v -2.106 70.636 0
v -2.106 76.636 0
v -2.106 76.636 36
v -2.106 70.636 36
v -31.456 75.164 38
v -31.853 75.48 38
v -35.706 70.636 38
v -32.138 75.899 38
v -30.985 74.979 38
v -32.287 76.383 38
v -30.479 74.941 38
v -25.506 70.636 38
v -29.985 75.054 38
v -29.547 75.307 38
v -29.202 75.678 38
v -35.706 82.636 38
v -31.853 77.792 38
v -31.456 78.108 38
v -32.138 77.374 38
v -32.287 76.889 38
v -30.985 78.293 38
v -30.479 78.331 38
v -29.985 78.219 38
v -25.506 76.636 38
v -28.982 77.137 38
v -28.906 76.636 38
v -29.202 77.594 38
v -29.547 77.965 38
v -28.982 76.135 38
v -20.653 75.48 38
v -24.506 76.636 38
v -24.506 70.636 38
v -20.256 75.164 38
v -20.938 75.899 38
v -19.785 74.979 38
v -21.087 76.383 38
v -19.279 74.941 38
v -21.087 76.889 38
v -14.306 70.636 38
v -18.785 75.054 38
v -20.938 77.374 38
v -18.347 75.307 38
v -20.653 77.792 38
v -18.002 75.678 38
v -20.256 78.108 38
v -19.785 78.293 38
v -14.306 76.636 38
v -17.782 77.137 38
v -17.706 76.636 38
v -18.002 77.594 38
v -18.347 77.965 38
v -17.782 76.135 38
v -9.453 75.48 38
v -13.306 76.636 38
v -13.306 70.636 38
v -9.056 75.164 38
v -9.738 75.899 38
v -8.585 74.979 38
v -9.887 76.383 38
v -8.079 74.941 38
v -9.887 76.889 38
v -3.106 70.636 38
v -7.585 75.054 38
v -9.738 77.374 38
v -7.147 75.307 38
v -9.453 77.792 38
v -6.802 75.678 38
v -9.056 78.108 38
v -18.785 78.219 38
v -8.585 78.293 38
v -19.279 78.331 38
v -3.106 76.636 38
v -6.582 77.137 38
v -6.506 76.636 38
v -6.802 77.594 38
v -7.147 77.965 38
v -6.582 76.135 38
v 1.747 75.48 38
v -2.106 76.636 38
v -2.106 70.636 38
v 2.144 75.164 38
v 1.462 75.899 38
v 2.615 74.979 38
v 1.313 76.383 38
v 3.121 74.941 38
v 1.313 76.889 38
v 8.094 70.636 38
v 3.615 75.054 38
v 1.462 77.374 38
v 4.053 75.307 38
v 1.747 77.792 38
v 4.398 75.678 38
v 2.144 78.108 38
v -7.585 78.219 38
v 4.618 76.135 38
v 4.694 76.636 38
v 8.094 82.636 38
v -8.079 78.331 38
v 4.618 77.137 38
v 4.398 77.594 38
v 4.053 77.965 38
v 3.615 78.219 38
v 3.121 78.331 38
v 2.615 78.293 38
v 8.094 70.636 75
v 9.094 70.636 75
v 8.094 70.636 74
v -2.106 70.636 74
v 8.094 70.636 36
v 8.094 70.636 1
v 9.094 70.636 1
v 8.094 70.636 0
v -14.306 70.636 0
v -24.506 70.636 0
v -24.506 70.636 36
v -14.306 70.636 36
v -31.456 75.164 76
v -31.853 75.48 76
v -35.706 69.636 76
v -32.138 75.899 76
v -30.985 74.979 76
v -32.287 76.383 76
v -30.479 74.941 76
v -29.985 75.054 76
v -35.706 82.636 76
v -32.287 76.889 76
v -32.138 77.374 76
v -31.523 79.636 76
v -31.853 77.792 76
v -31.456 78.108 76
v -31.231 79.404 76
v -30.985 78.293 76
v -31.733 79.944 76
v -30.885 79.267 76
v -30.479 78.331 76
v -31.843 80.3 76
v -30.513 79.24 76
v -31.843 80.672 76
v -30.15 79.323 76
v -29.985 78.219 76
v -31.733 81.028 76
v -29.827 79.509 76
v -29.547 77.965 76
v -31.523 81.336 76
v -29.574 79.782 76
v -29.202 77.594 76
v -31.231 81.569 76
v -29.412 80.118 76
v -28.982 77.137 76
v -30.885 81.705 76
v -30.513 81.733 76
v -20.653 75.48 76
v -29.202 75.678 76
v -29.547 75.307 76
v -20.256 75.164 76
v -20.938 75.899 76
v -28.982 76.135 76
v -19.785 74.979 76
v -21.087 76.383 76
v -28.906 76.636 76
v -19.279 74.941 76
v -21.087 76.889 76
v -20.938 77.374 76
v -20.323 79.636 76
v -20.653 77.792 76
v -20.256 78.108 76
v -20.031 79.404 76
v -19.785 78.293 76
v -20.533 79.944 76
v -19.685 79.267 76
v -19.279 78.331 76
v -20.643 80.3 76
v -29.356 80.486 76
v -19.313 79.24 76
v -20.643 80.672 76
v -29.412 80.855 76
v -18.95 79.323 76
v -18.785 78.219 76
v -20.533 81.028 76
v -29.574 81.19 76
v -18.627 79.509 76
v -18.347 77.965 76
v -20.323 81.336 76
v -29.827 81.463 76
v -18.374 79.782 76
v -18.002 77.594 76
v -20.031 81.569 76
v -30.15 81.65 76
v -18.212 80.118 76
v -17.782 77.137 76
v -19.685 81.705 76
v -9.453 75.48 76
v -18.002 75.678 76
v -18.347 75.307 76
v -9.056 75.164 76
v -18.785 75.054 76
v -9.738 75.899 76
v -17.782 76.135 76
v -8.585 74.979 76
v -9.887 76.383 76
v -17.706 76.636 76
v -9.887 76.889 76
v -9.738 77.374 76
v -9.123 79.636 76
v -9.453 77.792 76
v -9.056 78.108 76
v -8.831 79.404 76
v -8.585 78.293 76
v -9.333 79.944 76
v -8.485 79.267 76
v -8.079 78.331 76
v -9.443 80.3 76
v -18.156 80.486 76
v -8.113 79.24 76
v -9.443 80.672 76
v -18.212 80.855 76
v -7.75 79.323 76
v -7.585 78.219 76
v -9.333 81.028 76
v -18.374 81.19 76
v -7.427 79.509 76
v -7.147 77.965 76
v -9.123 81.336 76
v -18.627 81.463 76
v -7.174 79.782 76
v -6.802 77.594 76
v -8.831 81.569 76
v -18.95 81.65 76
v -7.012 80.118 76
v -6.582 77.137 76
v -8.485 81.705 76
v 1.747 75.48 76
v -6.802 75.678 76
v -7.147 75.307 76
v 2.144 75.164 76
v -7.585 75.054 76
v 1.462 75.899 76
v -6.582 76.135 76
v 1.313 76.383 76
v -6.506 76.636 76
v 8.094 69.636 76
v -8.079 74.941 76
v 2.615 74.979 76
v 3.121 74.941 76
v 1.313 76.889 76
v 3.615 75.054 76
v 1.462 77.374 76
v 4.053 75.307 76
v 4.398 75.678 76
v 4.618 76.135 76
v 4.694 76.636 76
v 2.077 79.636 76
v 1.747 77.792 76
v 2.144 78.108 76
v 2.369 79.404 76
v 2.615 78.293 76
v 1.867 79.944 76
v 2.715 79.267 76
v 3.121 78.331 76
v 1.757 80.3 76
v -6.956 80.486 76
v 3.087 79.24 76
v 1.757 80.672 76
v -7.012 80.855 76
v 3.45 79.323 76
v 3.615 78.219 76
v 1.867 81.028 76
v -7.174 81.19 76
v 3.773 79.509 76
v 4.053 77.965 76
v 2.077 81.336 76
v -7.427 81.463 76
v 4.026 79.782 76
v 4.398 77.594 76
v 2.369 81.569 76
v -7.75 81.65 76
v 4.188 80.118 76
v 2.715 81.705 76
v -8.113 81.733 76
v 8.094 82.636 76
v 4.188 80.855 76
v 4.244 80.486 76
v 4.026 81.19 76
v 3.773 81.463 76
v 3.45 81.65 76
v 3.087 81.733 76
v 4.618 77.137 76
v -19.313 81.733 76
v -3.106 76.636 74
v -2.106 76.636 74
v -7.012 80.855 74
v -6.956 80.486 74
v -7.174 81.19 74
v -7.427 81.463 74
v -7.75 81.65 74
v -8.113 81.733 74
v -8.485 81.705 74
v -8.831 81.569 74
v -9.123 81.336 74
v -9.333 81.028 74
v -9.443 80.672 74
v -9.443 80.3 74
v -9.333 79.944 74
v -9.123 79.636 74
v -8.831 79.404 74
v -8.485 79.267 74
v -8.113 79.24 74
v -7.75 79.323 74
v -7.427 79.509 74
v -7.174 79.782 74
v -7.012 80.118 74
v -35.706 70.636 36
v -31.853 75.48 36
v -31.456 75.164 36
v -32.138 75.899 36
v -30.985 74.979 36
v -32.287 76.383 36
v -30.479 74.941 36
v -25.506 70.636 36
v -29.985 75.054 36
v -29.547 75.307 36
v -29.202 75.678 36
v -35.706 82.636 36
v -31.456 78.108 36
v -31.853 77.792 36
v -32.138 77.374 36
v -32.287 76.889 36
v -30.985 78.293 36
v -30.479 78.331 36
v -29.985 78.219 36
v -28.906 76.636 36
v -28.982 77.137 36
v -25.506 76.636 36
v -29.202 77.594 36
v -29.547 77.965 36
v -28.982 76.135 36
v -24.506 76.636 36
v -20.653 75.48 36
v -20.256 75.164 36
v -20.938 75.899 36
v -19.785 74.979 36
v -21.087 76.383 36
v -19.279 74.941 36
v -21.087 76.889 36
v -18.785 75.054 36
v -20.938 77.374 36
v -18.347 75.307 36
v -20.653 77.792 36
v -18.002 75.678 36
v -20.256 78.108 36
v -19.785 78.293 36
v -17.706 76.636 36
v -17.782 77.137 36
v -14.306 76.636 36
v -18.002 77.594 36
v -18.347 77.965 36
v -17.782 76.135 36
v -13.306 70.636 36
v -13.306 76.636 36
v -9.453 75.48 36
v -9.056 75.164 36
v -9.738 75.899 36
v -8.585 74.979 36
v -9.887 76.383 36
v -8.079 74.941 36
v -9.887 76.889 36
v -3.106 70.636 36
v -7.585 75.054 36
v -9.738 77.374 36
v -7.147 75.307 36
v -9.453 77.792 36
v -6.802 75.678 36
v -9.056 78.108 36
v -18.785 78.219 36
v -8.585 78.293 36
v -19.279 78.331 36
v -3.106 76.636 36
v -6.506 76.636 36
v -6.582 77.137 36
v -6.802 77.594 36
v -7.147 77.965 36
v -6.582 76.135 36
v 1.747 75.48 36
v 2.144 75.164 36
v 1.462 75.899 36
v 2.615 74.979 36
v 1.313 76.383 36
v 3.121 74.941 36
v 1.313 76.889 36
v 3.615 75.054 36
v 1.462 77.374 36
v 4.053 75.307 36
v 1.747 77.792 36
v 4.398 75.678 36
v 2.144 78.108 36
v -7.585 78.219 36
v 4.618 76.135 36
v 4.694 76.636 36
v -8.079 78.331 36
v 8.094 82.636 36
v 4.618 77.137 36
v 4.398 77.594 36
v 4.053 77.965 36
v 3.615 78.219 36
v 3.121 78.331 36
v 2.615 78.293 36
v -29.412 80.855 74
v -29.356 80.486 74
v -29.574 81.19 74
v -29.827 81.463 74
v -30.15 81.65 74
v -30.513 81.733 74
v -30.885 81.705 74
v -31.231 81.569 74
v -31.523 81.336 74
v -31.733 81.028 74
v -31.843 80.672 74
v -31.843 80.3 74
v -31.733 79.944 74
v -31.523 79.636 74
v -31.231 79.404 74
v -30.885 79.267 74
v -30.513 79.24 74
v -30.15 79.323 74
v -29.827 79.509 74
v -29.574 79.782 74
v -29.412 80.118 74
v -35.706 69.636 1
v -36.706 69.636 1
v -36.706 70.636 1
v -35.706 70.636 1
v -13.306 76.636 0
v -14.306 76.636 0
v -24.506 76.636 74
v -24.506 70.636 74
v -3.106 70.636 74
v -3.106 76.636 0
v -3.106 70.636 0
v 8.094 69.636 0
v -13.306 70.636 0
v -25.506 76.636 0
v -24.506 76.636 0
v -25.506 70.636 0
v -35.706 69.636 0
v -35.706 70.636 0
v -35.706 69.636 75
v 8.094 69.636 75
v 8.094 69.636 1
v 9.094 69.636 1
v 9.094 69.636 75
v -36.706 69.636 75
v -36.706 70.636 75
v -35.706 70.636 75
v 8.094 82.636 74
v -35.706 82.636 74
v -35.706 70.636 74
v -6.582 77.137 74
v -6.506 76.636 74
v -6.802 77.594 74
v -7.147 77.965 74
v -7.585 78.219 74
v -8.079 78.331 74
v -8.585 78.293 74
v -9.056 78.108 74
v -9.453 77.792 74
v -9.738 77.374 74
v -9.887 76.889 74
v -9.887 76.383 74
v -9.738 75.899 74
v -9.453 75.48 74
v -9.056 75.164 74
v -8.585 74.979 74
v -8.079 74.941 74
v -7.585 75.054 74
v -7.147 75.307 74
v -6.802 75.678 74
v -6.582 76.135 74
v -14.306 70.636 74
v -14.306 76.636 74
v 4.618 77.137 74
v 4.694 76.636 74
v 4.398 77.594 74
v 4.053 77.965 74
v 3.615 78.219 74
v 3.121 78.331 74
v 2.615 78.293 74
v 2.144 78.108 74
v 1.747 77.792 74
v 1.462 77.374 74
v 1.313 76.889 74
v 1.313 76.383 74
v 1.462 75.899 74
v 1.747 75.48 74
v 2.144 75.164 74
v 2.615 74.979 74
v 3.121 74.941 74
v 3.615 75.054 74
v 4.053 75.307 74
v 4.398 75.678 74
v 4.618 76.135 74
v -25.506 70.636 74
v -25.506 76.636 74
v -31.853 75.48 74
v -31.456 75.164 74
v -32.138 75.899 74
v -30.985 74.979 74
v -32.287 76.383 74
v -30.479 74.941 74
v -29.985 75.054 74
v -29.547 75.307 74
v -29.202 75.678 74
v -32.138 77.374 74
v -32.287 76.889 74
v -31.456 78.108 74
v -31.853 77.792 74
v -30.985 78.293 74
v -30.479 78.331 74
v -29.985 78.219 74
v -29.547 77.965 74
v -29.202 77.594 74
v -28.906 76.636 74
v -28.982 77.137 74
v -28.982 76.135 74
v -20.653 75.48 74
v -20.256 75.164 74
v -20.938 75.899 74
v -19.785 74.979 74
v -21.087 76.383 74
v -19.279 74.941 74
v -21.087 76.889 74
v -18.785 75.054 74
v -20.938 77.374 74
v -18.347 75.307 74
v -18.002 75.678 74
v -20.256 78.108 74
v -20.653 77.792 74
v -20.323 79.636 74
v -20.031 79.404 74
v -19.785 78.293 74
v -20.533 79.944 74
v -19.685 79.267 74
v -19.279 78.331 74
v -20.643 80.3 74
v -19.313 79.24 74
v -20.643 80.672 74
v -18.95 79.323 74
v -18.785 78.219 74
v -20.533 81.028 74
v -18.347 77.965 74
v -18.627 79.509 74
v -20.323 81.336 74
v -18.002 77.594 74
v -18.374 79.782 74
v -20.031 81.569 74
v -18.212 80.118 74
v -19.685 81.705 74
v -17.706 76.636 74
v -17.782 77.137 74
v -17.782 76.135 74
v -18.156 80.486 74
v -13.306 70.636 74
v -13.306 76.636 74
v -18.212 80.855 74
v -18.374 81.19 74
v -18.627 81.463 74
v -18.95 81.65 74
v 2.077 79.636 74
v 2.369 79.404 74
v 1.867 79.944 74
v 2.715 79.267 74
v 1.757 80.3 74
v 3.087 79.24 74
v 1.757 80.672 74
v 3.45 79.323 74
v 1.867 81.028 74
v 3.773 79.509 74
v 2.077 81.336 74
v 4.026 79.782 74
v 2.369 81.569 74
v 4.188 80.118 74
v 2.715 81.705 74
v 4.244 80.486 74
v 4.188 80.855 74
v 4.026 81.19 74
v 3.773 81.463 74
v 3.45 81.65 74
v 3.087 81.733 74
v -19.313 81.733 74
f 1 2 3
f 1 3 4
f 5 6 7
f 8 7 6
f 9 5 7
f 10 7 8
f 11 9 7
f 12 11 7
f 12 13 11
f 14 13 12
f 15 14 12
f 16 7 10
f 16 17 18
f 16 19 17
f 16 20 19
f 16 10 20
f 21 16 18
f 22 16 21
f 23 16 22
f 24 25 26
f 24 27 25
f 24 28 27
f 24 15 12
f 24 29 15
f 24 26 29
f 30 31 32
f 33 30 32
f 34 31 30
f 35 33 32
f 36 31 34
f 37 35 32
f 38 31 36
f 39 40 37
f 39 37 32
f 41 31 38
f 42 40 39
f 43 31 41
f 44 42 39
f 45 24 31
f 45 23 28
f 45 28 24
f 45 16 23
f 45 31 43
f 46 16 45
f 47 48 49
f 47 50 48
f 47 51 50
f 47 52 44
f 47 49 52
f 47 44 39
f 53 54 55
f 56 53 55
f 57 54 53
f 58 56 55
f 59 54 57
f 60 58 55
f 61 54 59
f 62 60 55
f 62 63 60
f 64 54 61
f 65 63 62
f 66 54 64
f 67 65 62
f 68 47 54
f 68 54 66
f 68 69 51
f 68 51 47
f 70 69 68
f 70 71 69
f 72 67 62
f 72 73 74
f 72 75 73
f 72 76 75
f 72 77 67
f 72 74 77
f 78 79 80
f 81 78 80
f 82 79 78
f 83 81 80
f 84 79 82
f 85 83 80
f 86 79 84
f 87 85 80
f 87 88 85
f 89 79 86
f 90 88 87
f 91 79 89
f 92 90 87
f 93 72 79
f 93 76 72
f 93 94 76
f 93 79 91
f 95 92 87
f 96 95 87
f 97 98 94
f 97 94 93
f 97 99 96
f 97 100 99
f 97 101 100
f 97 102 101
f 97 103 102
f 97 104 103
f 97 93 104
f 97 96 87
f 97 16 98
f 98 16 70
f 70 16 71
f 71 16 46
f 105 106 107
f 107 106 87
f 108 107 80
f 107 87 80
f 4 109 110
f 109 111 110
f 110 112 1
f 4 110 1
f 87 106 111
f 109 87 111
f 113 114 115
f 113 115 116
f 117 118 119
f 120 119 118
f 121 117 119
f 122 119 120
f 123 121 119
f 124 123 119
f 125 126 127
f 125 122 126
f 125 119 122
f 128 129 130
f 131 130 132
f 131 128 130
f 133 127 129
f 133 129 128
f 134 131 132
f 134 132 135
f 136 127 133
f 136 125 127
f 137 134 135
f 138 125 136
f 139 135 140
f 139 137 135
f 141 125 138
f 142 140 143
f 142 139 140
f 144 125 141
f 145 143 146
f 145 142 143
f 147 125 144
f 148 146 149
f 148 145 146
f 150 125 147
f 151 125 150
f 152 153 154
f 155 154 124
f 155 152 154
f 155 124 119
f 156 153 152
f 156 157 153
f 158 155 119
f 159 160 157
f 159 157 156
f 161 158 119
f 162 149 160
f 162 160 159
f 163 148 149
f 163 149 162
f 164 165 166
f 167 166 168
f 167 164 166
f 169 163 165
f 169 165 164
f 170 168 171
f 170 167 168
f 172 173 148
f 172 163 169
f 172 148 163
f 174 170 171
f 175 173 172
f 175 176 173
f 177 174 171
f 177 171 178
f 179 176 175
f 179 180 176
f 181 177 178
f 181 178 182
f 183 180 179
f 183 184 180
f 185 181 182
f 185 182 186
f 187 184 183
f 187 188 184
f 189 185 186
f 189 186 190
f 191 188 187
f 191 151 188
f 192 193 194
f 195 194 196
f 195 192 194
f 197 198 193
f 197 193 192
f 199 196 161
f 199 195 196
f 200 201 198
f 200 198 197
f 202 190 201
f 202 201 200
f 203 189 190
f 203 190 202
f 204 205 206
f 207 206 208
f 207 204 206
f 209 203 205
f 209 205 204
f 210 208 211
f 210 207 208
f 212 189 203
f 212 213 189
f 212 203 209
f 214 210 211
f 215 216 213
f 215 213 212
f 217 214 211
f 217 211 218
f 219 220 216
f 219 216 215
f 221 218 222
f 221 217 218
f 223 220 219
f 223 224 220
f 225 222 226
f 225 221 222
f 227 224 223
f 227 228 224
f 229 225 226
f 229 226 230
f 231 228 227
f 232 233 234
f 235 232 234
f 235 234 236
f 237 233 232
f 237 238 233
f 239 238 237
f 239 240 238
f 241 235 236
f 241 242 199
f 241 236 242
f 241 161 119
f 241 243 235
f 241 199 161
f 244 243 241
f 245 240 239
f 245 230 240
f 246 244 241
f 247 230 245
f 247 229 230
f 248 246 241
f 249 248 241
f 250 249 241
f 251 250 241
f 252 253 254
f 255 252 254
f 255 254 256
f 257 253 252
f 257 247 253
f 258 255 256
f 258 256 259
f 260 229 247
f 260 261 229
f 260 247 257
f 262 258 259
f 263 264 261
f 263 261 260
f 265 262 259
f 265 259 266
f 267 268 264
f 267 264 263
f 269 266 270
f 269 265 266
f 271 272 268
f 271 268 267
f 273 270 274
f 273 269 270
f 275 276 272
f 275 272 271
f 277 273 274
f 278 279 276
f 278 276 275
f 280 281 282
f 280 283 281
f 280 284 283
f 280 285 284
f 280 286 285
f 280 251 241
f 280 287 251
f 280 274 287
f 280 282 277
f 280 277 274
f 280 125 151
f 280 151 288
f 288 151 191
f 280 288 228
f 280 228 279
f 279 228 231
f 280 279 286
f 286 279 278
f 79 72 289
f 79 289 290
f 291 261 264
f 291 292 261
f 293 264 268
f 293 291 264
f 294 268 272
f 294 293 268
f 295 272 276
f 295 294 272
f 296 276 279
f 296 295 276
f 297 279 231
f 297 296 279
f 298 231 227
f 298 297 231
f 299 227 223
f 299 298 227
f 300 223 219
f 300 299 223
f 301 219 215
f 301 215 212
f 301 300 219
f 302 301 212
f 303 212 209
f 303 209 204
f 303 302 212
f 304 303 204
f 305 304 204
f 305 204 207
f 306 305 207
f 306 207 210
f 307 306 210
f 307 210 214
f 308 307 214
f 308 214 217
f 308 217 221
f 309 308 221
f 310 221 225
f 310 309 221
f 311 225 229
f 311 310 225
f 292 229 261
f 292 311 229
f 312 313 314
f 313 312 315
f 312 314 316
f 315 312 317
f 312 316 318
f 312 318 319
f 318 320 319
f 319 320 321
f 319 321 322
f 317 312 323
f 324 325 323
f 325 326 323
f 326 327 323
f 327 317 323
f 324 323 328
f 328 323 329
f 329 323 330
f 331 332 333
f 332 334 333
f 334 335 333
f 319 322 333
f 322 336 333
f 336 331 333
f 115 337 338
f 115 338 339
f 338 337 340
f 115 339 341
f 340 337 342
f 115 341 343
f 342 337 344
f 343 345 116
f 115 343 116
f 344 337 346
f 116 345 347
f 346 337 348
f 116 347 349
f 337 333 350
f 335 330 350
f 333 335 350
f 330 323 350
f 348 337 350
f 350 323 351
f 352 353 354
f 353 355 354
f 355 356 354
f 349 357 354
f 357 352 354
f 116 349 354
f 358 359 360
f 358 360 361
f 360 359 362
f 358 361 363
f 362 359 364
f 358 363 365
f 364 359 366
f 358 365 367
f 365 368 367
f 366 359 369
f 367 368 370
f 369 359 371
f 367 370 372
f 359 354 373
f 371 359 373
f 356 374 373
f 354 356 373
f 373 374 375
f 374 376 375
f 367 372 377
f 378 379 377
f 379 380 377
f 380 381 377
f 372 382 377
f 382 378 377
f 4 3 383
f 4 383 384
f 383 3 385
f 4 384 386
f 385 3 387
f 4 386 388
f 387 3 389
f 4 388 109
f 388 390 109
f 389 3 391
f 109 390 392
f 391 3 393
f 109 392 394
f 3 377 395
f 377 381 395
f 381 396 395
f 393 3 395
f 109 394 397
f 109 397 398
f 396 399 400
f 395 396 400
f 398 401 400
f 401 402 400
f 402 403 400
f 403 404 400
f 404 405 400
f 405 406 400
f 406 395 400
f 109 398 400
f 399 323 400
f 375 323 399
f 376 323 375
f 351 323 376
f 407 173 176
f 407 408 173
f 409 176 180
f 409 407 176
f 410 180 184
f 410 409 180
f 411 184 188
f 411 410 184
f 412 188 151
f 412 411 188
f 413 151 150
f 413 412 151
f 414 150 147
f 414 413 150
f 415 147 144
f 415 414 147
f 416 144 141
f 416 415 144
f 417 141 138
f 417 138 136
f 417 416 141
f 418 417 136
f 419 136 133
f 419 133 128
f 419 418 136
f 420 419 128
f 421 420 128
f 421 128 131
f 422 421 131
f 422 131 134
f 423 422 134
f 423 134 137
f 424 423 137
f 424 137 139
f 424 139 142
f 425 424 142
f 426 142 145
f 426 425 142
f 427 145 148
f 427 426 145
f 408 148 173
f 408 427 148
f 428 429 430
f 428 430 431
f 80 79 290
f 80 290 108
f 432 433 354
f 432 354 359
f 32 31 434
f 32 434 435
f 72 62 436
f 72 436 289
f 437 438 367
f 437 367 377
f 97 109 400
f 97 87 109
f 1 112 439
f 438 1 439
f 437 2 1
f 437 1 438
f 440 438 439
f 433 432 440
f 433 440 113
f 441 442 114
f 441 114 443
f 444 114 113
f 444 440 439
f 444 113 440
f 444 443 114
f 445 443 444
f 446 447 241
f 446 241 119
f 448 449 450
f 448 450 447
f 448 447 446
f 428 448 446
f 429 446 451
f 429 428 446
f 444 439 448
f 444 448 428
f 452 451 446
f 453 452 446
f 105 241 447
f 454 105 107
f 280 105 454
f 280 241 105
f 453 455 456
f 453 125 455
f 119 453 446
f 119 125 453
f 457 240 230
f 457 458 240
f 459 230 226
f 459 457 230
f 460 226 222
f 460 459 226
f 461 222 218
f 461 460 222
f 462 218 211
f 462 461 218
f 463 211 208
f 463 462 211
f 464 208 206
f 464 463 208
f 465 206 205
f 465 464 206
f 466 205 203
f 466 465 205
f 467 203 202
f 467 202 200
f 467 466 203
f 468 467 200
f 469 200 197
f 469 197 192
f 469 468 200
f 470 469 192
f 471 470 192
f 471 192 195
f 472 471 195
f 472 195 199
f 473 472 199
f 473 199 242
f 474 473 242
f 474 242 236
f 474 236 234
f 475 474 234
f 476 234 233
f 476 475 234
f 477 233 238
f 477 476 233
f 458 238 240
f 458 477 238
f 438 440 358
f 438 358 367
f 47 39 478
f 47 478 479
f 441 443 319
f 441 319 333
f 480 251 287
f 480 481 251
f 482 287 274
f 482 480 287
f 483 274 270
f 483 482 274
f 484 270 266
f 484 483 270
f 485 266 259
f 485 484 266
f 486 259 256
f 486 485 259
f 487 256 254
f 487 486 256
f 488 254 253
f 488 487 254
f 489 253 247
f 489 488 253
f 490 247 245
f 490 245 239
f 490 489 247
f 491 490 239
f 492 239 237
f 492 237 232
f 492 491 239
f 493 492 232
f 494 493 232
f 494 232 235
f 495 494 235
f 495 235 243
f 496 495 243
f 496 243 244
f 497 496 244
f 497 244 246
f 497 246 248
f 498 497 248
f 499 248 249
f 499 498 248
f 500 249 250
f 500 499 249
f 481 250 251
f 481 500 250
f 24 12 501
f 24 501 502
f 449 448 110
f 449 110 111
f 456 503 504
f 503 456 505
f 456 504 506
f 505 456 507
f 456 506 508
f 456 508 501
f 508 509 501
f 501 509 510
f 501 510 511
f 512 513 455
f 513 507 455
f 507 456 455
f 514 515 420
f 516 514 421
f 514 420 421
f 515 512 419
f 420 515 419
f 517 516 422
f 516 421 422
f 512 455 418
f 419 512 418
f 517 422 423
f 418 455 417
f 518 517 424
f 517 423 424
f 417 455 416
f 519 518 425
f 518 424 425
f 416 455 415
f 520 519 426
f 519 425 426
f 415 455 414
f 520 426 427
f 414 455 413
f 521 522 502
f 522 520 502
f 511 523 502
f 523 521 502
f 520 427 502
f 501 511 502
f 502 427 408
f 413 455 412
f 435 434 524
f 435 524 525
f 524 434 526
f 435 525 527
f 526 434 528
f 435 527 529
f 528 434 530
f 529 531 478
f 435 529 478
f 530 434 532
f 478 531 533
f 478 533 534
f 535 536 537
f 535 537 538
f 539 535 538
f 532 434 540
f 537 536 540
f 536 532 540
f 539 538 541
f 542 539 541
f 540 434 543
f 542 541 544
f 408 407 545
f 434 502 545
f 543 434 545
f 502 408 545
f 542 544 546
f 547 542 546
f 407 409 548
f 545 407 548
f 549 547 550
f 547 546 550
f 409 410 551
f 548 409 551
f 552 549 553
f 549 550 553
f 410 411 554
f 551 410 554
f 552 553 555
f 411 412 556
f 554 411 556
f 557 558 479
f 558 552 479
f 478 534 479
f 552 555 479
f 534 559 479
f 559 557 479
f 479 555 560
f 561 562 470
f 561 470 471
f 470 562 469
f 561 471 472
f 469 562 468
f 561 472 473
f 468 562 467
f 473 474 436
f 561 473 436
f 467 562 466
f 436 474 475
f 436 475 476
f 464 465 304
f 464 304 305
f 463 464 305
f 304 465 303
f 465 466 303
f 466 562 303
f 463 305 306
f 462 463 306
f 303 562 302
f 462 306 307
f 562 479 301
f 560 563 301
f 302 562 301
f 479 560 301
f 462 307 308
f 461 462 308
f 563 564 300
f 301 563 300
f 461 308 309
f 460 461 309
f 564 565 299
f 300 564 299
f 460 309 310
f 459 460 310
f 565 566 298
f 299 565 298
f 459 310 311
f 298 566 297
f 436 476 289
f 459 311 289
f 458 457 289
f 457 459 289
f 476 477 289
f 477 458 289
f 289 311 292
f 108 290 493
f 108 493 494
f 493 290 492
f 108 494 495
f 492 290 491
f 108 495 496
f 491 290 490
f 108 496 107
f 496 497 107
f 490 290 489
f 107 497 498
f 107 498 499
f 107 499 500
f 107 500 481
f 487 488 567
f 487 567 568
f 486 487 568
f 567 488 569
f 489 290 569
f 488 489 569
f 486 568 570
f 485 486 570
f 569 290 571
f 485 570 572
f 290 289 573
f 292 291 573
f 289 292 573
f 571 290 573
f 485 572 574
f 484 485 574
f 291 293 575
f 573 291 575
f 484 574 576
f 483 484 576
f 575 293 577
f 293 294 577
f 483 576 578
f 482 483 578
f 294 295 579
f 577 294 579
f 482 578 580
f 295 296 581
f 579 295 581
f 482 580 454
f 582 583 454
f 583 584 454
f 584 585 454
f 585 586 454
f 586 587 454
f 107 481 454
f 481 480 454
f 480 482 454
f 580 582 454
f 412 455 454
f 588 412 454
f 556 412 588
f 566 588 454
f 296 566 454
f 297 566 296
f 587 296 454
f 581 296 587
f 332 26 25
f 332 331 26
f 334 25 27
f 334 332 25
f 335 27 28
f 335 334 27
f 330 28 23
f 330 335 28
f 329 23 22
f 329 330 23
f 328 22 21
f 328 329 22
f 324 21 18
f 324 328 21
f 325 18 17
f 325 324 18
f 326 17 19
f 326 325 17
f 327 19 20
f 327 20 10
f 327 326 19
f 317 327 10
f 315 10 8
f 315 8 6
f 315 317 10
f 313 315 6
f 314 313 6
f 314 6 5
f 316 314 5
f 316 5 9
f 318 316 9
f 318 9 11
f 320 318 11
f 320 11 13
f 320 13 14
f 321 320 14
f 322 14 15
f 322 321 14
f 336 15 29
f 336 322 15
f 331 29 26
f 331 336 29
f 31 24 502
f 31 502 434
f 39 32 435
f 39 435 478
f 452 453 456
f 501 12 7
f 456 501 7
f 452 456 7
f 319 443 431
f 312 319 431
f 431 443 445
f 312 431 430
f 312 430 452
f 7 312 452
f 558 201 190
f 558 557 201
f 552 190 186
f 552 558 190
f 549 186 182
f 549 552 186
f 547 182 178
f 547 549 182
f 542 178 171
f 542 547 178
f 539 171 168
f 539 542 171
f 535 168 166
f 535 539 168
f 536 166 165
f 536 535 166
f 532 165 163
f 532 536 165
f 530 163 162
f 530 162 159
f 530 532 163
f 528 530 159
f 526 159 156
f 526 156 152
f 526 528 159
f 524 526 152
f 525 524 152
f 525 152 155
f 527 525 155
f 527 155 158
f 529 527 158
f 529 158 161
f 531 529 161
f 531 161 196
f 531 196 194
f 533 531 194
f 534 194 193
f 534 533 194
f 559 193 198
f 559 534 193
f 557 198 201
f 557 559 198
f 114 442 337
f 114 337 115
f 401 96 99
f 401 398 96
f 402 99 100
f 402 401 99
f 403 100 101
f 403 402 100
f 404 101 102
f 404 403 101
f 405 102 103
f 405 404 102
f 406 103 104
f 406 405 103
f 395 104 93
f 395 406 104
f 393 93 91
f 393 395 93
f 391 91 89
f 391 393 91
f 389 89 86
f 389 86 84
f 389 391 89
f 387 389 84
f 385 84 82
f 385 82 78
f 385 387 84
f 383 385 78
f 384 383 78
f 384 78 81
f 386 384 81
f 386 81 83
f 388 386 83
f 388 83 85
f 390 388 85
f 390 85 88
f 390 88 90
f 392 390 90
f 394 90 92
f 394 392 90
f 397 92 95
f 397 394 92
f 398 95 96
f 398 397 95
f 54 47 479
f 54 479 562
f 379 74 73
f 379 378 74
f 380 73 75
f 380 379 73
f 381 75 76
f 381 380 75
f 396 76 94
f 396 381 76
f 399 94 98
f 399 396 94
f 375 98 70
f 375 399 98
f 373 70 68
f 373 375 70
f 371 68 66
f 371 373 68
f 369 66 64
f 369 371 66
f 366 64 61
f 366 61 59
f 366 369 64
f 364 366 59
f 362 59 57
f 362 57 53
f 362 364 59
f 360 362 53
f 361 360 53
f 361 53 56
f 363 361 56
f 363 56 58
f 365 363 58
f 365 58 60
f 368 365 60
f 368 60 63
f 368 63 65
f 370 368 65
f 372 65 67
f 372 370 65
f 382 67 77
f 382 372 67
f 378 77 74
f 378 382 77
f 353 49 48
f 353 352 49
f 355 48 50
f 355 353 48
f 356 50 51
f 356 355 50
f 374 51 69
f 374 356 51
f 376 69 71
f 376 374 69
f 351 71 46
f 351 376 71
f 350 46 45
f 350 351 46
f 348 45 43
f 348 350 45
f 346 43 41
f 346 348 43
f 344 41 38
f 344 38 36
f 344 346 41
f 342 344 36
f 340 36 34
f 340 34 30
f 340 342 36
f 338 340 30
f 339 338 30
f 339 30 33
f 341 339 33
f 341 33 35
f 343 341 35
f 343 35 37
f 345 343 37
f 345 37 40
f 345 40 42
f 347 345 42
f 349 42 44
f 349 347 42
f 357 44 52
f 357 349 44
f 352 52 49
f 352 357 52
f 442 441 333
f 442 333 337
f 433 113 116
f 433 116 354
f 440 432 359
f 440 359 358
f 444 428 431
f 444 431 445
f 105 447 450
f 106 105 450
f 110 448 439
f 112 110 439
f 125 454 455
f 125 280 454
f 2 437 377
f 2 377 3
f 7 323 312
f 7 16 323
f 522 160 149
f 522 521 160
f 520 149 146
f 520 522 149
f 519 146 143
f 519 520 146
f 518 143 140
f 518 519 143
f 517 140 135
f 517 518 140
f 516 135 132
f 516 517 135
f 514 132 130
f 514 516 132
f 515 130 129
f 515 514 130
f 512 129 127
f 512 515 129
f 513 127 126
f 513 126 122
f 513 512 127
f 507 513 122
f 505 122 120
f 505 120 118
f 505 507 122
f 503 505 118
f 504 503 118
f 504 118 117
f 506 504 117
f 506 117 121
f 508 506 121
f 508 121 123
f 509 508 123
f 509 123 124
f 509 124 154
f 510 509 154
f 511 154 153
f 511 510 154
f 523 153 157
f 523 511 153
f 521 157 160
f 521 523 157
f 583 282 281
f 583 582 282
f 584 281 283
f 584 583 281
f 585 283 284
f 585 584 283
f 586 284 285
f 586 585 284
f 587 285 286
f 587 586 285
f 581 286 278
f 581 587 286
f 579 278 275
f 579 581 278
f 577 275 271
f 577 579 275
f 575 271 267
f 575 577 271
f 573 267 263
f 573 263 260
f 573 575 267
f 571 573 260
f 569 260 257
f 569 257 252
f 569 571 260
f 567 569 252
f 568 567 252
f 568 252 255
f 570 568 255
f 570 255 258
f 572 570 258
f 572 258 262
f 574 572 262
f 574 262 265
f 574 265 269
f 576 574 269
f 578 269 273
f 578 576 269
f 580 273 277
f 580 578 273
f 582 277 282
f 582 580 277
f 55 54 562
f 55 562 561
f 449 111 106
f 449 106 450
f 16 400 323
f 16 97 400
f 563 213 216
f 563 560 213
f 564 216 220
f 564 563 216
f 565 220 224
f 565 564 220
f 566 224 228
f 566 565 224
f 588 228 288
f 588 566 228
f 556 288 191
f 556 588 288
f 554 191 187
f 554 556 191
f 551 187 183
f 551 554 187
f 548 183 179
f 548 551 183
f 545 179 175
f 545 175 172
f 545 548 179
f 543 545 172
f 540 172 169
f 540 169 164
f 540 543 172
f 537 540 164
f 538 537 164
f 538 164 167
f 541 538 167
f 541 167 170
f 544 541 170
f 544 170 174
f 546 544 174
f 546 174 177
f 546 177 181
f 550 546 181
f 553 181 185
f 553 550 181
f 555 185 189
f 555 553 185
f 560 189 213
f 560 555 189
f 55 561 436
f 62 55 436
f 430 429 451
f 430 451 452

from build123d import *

# Parameters (mm, degrees)
GEARBOX_MOUNT_DEPTH = 76
BOSS_EXTRUDE6_START = 37
SKETCH7_R           = 1.7
BOSS_EXTRUDE6_DEPTH = 1
BOSS_EXTRUDE7_START = 75
SKETCH8_R           = 1.7
SKETCH8_R_2         = 1.25
BOSS_EXTRUDE7_DEPTH = 1
SKETCH9_W           = 1
SKETCH9_H           = 1
CUT_EXTRUDE1_DEPTH  = 119.118983452


with BuildPart() as part:
    # Sketch2 → Gearbox Mount (new body)
    with BuildSketch(Plane.XY):
        Polygon((-24.506477671, 76.636122542), (-24.506477671, 70.636122542), (-14.306477671, 70.636122542), (-14.306477671, 76.636122542), (-13.306477671, 76.636122542), (-13.306477671, 70.636122542), (-3.106477671, 70.636122542), (-3.106477671, 76.636122542), (-2.106477671, 76.636122542), (-2.106477671, 70.636122542), (8.093522329, 70.636122542), (9.093522329, 70.636122542), (9.093522329, 69.636122542), (-36.706477671, 69.636122542), (-36.706477671, 70.636122542), (-35.706477671, 70.636122542), (-25.506477671, 70.636122542), (-25.506477671, 76.636122542), align=None)
    extrude(amount=GEARBOX_MOUNT_DEPTH)

    # Sketch7 → Boss-Extrude6 (add, symmetric)
    with BuildSketch(Plane.XY.offset(BOSS_EXTRUDE6_START)):
        Polygon((-24.506477671, 76.636122542), (-24.506477671, 70.636122542), (-14.306477671, 70.636122542), (-14.306477671, 76.636122542), (-13.306477671, 76.636122542), (-13.306477671, 70.636122542), (-3.106477671, 70.636122542), (-3.106477671, 76.636122542), (-2.106477671, 76.636122542), (-2.106477671, 70.636122542), (8.093522329, 70.636122542), (8.093522329, 82.636122542), (-35.706477671, 82.636122542), (-35.706477671, 70.636122542), (-25.506477671, 70.636122542), (-25.506477671, 76.636122542), align=None)
        with Locations((-19.406477671, 76.636122542)):
            Circle(SKETCH7_R, mode=Mode.SUBTRACT)
        with Locations((-30.606477671, 76.636122542)):
            Circle(SKETCH7_R, mode=Mode.SUBTRACT)
        with Locations((-8.206477671, 76.636122542)):
            Circle(SKETCH7_R, mode=Mode.SUBTRACT)
        with Locations((2.993522329, 76.636122542)):
            Circle(SKETCH7_R, mode=Mode.SUBTRACT)
    extrude(amount=BOSS_EXTRUDE6_DEPTH, both=True)

    # Sketch8 → Boss-Extrude7 (add, symmetric)
    with BuildSketch(Plane.XY.offset(BOSS_EXTRUDE7_START)):
        Polygon((-35.706477671, 82.636122542), (-35.706477671, 70.636122542), (-25.506477671, 70.636122542), (-25.506477671, 76.636122542), (-24.506477671, 76.636122542), (-24.506477671, 70.636122542), (-14.306477671, 70.636122542), (-14.306477671, 76.636122542), (-13.306477671, 76.636122542), (-13.306477671, 70.636122542), (-3.106477671, 70.636122542), (-3.106477671, 76.636122542), (-2.106477671, 76.636122542), (-2.106477671, 70.636122542), (8.093522329, 70.636122542), (8.093522329, 82.636122542), align=None)
        with Locations((-30.606477671, 76.636122542)):
            Circle(SKETCH8_R, mode=Mode.SUBTRACT)
        with Locations((-30.606477671, 80.486122542)):
            Circle(SKETCH8_R_2, mode=Mode.SUBTRACT)
        with Locations((-19.406477671, 80.486122542)):
            Circle(SKETCH8_R_2, mode=Mode.SUBTRACT)
        with Locations((-19.406477671, 76.636122542)):
            Circle(SKETCH8_R, mode=Mode.SUBTRACT)
        with Locations((-8.206477671, 80.486122542)):
            Circle(SKETCH8_R_2, mode=Mode.SUBTRACT)
        with Locations((-8.206477671, 76.636122542)):
            Circle(SKETCH8_R, mode=Mode.SUBTRACT)
        with Locations((2.993522329, 80.486122542)):
            Circle(SKETCH8_R_2, mode=Mode.SUBTRACT)
        with Locations((2.993522329, 76.636122542)):
            Circle(SKETCH8_R, mode=Mode.SUBTRACT)
    extrude(amount=BOSS_EXTRUDE7_DEPTH, both=True)

    # Sketch9 → Cut-Extrude1 (cut, through all)
    with BuildSketch(Plane(origin=(0, 0, 0), x_dir=(1, 0, 0), z_dir=(0, 1, 0))):
        with Locations((-36.206477671, -0.5)):
            Rectangle(SKETCH9_W, SKETCH9_H)
        with Locations((8.593522329, -0.5)):
            Rectangle(SKETCH9_W, SKETCH9_H)
        with Locations((8.593522329, -75.5)):
            Rectangle(SKETCH9_W, SKETCH9_H)
        with Locations((-36.206477671, -75.5)):
            Rectangle(SKETCH9_W, SKETCH9_H)
    extrude(amount=CUT_EXTRUDE1_DEPTH, mode=Mode.SUBTRACT)


solid = part.part
